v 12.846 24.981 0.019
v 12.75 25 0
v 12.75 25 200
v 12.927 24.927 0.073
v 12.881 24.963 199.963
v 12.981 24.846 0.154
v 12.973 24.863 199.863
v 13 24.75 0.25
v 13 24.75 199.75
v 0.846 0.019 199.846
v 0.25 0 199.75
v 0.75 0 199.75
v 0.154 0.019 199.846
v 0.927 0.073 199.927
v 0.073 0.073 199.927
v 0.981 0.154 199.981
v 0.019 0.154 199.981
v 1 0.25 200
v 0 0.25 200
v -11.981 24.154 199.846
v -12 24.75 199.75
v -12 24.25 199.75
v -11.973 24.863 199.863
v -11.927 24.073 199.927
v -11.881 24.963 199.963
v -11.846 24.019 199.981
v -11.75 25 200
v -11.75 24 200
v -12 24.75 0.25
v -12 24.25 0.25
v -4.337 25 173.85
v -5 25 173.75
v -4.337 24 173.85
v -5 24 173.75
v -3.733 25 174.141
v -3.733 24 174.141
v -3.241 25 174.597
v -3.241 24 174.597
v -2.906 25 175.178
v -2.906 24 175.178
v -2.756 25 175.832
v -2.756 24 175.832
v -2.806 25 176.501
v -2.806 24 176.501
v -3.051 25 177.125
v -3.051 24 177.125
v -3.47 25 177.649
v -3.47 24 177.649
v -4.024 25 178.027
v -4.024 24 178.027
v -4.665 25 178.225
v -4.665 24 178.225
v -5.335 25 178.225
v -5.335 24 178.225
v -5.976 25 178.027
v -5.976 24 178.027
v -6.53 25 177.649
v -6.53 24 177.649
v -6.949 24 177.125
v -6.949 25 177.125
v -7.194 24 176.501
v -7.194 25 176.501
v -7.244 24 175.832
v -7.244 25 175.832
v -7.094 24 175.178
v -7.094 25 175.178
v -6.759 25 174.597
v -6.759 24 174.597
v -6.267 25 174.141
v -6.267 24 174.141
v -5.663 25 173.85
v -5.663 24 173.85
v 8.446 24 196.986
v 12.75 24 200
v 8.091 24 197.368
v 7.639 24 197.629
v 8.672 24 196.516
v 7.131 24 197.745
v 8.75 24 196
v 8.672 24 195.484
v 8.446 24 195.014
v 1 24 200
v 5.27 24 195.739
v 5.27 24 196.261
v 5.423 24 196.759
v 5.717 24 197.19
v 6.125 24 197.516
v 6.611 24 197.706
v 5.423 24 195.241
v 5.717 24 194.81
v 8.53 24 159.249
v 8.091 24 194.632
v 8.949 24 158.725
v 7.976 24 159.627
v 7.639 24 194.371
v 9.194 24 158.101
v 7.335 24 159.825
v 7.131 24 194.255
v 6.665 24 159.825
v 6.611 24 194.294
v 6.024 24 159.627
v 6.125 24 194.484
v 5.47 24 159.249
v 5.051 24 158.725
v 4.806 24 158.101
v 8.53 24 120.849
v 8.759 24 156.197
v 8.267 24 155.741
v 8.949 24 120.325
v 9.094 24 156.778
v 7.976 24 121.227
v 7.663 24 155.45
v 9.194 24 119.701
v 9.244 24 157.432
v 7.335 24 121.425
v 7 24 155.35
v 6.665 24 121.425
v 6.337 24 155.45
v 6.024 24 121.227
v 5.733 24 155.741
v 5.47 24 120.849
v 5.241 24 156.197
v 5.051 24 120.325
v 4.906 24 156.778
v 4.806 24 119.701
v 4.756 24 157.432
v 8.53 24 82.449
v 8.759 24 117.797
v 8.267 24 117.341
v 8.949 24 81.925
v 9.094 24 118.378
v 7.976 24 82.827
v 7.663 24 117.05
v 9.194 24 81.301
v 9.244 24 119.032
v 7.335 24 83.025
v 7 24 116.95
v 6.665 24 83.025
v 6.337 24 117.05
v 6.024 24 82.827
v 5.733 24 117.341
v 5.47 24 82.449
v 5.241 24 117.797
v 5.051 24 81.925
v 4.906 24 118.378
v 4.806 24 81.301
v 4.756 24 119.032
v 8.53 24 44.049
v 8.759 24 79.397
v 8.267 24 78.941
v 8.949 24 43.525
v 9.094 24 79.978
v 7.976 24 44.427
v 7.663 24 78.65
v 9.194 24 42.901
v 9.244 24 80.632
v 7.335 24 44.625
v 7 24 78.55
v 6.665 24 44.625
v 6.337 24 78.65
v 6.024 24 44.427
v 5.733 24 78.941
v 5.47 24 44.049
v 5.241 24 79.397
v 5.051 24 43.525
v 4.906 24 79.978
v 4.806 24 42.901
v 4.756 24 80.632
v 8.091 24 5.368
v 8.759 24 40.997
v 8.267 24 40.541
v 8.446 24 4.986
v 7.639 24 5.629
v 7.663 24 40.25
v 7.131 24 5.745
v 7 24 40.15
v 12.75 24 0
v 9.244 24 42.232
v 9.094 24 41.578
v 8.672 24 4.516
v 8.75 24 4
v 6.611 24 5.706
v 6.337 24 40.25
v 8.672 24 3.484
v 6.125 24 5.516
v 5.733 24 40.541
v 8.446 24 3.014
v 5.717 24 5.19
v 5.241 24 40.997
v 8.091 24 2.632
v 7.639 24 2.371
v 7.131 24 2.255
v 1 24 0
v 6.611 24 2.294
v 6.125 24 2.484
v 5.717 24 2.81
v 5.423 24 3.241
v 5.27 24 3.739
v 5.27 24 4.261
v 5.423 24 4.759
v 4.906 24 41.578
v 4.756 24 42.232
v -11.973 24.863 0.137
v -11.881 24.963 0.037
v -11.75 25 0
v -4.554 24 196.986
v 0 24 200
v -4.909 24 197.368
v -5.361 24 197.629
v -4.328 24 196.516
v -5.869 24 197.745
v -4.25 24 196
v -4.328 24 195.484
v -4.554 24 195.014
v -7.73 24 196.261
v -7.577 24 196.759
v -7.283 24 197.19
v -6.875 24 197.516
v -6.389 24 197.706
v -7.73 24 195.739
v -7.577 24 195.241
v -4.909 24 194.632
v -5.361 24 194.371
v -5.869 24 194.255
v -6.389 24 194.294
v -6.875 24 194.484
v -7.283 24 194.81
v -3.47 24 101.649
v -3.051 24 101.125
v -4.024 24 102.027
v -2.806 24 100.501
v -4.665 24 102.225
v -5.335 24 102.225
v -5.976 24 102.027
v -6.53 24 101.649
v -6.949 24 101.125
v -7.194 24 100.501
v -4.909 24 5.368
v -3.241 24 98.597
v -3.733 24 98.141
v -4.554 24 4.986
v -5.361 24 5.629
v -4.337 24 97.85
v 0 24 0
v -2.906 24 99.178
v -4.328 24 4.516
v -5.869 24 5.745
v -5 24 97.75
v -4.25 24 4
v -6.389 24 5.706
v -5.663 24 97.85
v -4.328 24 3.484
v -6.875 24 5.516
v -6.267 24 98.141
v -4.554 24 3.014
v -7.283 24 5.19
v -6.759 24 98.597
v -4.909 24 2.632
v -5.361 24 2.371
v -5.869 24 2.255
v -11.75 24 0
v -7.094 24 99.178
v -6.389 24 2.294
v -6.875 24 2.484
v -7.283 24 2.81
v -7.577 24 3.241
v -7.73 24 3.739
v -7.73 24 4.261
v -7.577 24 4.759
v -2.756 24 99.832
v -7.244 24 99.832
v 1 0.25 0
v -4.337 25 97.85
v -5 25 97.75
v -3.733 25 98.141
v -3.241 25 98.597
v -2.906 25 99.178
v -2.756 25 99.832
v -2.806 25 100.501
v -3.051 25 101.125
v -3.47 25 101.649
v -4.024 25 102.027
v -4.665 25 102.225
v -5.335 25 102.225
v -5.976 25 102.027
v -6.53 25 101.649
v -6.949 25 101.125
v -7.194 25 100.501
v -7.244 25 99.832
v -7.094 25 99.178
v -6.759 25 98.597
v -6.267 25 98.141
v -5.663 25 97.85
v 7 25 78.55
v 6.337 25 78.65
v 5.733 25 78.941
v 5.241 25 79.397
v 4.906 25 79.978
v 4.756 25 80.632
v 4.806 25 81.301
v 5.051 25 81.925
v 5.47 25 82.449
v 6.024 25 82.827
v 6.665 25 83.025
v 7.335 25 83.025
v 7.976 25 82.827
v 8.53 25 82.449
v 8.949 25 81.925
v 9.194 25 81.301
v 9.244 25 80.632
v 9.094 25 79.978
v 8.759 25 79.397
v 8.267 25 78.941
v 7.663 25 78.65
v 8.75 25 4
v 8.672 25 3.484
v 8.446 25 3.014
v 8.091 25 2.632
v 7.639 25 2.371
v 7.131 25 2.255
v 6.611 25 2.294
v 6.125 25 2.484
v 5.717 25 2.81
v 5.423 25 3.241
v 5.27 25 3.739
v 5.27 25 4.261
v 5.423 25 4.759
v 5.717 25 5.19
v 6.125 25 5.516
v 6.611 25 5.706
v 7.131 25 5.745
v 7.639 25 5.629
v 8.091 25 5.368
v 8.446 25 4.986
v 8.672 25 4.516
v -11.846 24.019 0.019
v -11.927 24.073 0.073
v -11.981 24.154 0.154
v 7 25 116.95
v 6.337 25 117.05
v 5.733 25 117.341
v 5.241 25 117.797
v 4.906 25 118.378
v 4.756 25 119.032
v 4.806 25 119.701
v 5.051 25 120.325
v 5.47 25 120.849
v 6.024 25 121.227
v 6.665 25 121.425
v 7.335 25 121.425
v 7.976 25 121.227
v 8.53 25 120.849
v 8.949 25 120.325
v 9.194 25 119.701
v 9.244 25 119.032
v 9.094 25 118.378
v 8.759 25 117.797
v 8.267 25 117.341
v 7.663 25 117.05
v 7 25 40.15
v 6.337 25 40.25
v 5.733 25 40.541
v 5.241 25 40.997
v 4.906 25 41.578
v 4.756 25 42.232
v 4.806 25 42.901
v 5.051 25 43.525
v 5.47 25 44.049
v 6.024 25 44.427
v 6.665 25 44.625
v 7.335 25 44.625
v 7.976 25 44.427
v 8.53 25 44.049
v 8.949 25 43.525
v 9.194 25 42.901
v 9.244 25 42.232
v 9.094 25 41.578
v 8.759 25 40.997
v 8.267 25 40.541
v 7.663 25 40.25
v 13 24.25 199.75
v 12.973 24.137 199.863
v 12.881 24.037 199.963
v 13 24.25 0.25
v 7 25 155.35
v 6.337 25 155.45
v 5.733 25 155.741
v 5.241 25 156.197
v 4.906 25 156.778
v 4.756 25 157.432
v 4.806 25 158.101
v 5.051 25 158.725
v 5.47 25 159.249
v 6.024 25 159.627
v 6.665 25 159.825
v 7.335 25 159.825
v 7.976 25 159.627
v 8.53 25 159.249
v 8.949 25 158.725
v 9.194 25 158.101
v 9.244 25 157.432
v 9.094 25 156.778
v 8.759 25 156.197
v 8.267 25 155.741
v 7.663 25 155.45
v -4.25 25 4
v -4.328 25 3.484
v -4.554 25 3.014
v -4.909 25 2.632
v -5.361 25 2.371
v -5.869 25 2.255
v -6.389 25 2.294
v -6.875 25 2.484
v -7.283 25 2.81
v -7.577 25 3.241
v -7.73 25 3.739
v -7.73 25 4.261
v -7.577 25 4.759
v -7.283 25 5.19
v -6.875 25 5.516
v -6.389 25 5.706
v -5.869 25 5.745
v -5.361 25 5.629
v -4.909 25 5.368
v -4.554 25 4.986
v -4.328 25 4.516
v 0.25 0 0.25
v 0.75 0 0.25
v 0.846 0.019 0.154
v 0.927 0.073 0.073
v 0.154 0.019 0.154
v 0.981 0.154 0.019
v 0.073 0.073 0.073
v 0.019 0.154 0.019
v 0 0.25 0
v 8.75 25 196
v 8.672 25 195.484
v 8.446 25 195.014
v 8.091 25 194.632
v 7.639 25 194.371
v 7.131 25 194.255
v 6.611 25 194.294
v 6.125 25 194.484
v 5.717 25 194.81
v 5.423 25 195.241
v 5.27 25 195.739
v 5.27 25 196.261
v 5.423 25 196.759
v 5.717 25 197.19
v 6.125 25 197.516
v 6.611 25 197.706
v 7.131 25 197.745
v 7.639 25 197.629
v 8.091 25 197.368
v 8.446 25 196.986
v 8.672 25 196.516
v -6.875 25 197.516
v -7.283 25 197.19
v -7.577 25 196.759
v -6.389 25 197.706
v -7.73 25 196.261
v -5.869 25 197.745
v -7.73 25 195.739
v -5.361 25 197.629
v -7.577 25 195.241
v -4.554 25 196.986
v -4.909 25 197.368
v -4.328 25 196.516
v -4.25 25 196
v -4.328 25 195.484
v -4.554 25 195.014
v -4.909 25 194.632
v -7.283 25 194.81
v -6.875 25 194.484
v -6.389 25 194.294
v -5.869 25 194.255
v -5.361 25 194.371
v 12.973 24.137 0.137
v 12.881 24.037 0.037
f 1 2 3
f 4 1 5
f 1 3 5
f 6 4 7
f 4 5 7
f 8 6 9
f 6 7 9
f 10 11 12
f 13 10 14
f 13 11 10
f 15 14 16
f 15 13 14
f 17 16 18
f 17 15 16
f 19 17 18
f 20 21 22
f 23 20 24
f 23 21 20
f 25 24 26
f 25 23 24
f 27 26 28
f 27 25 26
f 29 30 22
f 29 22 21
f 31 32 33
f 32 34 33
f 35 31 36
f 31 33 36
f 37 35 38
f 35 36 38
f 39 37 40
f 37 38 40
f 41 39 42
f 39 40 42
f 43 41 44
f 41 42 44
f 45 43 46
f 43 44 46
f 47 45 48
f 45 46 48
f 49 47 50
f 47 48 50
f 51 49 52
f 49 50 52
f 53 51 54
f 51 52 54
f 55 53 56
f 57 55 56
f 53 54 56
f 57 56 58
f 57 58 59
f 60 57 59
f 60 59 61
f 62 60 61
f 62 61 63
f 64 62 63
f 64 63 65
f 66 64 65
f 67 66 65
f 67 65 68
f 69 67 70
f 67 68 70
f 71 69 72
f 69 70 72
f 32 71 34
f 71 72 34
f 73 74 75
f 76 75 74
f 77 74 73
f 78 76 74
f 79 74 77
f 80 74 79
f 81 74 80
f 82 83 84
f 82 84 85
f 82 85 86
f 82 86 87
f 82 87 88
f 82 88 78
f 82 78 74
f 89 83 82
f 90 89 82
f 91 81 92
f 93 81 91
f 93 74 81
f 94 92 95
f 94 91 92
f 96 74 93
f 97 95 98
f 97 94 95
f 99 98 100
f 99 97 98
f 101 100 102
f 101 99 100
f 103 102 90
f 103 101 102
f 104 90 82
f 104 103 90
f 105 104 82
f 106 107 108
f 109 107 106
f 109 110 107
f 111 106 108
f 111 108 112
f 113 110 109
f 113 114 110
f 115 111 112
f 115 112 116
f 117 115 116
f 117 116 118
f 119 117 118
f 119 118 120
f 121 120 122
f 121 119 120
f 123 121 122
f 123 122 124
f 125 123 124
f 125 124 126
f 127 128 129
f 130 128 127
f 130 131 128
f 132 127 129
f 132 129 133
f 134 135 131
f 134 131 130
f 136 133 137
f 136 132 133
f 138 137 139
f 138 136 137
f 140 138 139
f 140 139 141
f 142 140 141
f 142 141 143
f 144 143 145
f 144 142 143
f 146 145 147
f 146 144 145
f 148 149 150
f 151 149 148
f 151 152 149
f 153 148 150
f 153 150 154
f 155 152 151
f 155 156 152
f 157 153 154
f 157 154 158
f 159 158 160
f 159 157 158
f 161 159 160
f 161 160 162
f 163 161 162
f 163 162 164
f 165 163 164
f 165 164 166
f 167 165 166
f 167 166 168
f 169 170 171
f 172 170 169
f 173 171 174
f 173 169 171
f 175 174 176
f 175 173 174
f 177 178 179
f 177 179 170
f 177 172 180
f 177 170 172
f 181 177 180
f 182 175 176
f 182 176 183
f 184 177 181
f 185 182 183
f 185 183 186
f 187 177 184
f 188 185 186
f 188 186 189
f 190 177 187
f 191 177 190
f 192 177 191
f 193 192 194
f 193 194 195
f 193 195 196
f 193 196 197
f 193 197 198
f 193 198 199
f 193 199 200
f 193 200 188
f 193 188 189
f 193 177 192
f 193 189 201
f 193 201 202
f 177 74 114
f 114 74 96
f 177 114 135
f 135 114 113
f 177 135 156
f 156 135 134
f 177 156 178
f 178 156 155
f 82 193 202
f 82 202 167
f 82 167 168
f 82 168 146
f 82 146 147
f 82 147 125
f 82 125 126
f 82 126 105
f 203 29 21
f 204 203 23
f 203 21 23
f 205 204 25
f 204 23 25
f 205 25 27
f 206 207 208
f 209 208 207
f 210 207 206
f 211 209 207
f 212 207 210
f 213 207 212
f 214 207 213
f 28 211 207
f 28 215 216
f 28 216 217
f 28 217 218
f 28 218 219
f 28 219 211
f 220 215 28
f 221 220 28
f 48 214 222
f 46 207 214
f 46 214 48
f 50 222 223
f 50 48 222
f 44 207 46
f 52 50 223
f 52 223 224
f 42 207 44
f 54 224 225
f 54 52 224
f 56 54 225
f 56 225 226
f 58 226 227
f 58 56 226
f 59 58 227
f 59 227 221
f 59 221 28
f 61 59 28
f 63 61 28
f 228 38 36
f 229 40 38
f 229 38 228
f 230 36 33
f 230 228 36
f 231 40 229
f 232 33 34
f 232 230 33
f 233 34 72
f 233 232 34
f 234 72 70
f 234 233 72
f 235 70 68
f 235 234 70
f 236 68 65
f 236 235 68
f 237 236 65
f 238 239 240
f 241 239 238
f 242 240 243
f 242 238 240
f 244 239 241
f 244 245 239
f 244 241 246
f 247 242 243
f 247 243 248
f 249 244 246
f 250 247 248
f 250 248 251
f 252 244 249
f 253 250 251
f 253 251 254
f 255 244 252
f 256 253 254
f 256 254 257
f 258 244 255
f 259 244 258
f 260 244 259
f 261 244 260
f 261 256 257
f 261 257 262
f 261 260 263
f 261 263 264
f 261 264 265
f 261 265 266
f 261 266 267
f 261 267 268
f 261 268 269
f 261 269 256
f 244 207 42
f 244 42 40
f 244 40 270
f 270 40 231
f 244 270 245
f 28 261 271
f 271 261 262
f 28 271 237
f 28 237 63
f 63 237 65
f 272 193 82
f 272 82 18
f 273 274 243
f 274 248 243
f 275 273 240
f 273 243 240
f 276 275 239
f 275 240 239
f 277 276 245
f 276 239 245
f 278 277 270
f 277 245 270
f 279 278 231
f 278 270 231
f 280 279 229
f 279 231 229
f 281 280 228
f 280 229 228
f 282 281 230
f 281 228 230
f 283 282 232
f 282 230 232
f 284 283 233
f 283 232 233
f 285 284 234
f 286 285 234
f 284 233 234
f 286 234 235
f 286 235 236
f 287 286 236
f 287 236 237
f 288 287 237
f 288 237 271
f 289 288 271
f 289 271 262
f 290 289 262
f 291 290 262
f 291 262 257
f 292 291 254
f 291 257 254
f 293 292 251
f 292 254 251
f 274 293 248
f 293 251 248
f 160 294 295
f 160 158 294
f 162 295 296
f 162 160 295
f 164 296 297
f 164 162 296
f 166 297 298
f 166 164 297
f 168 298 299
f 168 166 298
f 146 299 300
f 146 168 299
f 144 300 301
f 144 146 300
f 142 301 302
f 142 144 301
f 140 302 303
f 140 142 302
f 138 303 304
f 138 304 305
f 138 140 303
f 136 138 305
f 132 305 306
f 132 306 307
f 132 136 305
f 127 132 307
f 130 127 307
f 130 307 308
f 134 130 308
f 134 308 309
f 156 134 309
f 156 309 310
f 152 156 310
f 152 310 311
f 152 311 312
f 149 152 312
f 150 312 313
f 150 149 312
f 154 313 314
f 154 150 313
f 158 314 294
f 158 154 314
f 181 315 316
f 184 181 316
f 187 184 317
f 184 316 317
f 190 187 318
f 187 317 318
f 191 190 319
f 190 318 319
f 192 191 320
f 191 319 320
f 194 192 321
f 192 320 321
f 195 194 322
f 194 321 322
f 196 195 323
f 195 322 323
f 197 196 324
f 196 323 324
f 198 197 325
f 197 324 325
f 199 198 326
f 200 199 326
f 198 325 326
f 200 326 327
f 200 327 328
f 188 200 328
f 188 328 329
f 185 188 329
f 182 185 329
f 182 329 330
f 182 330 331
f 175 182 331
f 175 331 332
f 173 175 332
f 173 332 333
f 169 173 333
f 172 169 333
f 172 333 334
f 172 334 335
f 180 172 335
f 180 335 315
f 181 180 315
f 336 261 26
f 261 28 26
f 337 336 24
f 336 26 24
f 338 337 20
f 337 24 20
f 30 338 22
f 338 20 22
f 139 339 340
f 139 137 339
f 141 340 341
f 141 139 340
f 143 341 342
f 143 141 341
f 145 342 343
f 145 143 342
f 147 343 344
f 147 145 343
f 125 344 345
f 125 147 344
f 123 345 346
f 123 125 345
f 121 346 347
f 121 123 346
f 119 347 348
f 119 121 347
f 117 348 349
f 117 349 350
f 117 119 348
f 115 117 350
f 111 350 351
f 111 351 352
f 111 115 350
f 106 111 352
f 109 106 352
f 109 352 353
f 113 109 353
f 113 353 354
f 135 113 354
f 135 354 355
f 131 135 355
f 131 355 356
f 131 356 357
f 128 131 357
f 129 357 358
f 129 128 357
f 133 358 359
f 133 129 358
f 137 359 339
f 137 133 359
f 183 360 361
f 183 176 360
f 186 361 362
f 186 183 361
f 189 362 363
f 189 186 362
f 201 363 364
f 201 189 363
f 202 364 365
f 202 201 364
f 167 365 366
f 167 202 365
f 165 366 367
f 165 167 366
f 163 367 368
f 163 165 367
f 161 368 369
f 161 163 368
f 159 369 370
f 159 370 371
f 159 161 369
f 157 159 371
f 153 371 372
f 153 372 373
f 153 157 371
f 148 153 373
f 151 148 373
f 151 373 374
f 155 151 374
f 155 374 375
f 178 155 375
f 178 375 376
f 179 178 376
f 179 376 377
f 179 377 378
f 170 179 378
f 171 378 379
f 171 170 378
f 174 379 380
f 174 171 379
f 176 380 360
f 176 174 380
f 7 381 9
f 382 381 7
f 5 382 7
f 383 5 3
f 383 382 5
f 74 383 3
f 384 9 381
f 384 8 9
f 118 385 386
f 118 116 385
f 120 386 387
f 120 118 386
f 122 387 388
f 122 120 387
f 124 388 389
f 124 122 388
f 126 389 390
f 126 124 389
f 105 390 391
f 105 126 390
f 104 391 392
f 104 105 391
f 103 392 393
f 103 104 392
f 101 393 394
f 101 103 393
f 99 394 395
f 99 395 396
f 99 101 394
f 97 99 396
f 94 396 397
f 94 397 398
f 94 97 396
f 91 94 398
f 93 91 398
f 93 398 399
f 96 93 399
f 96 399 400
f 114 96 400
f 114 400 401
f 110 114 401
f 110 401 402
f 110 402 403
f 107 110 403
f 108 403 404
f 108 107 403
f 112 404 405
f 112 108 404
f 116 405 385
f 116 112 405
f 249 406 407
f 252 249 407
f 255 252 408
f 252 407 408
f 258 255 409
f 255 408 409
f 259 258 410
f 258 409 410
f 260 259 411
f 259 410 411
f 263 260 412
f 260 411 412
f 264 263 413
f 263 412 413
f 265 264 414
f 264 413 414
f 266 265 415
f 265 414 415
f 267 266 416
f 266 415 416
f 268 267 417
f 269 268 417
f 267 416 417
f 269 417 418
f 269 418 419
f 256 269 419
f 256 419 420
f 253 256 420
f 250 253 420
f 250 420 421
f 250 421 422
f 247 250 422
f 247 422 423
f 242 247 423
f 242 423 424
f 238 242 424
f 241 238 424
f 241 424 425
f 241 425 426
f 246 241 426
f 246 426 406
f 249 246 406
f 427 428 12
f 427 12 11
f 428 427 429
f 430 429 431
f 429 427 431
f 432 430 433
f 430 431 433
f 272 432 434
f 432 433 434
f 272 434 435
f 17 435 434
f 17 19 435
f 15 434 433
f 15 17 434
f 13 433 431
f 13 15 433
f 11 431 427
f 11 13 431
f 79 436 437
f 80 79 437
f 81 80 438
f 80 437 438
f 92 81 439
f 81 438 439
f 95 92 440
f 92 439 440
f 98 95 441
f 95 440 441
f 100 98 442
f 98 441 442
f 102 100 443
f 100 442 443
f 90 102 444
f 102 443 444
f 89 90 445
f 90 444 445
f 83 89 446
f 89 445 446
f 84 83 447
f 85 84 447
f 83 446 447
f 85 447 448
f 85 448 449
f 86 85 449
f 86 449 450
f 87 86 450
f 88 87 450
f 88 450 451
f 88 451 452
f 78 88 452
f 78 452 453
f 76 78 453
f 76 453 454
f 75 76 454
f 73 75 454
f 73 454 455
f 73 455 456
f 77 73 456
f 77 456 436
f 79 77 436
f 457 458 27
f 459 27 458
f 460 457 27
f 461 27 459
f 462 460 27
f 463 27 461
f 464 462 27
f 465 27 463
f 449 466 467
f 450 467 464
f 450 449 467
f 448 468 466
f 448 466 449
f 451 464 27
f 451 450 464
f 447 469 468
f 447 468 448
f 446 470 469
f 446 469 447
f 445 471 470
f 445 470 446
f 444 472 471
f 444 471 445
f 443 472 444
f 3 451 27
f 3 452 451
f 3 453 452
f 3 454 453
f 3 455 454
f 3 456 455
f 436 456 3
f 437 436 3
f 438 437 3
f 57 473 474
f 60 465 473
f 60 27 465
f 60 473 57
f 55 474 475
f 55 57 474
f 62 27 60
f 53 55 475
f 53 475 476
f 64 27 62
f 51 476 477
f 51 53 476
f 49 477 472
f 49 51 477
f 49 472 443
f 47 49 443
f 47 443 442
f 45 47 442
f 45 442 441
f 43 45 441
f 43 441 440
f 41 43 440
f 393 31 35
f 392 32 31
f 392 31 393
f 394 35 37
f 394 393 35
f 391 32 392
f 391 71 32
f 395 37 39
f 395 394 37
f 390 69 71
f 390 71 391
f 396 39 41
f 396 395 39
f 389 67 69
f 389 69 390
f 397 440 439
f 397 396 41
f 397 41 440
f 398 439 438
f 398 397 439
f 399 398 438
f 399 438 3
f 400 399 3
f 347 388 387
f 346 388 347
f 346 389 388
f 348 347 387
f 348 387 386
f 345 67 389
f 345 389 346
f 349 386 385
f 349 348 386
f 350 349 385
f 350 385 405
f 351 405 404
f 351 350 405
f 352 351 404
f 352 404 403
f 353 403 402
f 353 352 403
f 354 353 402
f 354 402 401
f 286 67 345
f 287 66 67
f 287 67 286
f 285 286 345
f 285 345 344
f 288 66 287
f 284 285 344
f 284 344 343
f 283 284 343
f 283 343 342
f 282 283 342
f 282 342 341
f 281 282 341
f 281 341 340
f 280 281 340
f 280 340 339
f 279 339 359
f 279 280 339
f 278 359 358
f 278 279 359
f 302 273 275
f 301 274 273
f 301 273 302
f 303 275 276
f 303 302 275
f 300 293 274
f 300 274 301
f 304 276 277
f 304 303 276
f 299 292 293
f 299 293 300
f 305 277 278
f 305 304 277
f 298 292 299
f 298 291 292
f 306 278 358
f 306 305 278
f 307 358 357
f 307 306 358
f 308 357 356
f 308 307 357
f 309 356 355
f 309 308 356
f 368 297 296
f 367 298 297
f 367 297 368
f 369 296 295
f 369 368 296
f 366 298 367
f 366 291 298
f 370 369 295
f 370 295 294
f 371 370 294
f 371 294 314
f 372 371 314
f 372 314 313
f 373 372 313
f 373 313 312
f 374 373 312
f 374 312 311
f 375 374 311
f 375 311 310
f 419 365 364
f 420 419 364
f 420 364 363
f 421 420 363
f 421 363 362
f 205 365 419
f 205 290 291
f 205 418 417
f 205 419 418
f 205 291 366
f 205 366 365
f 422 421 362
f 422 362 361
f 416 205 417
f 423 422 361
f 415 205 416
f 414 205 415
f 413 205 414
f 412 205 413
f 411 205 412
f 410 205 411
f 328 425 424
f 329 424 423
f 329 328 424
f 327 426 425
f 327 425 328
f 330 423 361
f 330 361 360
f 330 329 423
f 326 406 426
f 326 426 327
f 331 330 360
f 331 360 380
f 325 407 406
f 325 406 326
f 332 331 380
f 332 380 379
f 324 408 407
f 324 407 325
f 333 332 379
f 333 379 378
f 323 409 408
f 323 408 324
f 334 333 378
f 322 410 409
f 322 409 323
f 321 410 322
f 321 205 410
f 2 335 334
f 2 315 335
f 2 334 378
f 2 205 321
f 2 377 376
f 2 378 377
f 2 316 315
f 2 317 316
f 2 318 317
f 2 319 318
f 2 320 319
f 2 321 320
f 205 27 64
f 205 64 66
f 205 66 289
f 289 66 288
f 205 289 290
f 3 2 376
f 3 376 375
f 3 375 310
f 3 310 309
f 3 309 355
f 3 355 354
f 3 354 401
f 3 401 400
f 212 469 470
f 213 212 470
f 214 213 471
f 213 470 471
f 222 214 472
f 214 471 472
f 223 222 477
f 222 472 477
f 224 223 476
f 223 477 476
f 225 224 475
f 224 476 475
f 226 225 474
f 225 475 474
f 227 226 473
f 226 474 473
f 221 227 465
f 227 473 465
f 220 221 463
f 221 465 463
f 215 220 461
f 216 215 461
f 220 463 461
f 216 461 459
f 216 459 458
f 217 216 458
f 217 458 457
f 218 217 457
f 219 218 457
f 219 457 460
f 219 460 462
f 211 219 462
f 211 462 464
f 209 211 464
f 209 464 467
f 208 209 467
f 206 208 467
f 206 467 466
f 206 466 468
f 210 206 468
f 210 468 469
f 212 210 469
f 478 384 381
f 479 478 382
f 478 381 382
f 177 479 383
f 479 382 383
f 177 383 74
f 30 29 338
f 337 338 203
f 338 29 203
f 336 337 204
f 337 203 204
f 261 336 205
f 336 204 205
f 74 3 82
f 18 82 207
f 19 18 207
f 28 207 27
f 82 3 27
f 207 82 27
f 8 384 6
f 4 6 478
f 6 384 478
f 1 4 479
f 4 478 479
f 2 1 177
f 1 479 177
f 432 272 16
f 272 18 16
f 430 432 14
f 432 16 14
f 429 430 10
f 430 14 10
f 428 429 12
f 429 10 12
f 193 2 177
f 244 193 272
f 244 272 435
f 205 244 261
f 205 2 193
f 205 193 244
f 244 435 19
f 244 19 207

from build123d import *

# Parameters (mm, degrees)
EXTRUDE1_DEPTH                 = 200
FILLET1_R                      = 0.25
F_3_5_3_5_DIAMETER_HOLE1_D     = 3.5
F_4_5_4_5_DIAMETER_HOLE1_D     = 4.5
F_4_5_4_5_DIAMETER_HOLE1_DEPTH = 1
F_4_5_4_5_DIAMETER_HOLE1_TIP   = 1.351936393
LPATTERN1_COUNT                = 4
LPATTERN1_PITCH                = 38.4


with BuildPart() as part:
    # Sketch1 → Extrude1 (new body)
    with BuildSketch(Plane.XY):
        Polygon((0, 0), (0, 24), (-12, 24), (-12, 25), (13, 25), (13, 24), (1, 24), (1, 0), align=None)
    extrude(amount=EXTRUDE1_DEPTH)

    # Fillet1
    fillet1_edges = [part.edges().sort_by_distance(p)[0] for p in [
        (0, 0, 100),
        (-12, 24, 100),
        (-12, 25, 100),
        (13, 24.5, 200),
        (13, 25, 100),
        (13, 24, 100),
        (1, 0, 100),
        (-12, 24.5, 200),
        (0.5, 0, 200),
        (-12, 24.5, 0),
        (13, 24.5, 0),
        (0.5, 0, 0),
    ]]
    fillet(fillet1_edges, radius=FILLET1_R)

    # Ø3.5 (3.5) Diameter Hole1 (through all)
    with Locations(Plane(origin=(-6, 24, 196), x_dir=(-1, 0, 0), z_dir=(0, -1, 0))):
        with Locations((0, 0), (-13, 0), (0, 192), (-13, 192)):
            Hole(F_3_5_3_5_DIAMETER_HOLE1_D / 2)

    # Ø4.5 (4.5) Diameter Hole1
    with Locations(Plane(origin=(-5, 25, 176), x_dir=(0, 0, 1), z_dir=(0, 1, 0))):
        with Locations((0, 0), (-76, 0)):
            Hole(F_4_5_4_5_DIAMETER_HOLE1_D / 2, depth=F_4_5_4_5_DIAMETER_HOLE1_DEPTH)
            with Locations((0, 0, -(F_4_5_4_5_DIAMETER_HOLE1_DEPTH + F_4_5_4_5_DIAMETER_HOLE1_TIP / 2))):  # 118° drill point
                Cone(0, F_4_5_4_5_DIAMETER_HOLE1_D / 2, F_4_5_4_5_DIAMETER_HOLE1_TIP, mode=Mode.SUBTRACT)

    # Sketch10 → Ø4.5 (4.5) Diameter Hole2 (revolve, cut)
    with BuildSketch(Plane(origin=(7, 24, 157.6), x_dir=(0, 0, -1), z_dir=(1, 0, 0))):
        Polygon((0, 0), (0, 2.351936393), (2.25, 1), (2.25, 0), align=None)
    f_4_5_4_5_diameter_hole2 = revolve(axis=Axis((7, 17.65, 157.6), (0, 1, 0)), mode=Mode.SUBTRACT)

    # LPattern1: Ø4.5 (4.5) Diameter Hole2 ×4
    with Locations(*[(0, 0, -i * LPATTERN1_PITCH) for i in range(1, LPATTERN1_COUNT)]):
        add(f_4_5_4_5_diameter_hole2, mode=Mode.SUBTRACT)


solid = part.part
